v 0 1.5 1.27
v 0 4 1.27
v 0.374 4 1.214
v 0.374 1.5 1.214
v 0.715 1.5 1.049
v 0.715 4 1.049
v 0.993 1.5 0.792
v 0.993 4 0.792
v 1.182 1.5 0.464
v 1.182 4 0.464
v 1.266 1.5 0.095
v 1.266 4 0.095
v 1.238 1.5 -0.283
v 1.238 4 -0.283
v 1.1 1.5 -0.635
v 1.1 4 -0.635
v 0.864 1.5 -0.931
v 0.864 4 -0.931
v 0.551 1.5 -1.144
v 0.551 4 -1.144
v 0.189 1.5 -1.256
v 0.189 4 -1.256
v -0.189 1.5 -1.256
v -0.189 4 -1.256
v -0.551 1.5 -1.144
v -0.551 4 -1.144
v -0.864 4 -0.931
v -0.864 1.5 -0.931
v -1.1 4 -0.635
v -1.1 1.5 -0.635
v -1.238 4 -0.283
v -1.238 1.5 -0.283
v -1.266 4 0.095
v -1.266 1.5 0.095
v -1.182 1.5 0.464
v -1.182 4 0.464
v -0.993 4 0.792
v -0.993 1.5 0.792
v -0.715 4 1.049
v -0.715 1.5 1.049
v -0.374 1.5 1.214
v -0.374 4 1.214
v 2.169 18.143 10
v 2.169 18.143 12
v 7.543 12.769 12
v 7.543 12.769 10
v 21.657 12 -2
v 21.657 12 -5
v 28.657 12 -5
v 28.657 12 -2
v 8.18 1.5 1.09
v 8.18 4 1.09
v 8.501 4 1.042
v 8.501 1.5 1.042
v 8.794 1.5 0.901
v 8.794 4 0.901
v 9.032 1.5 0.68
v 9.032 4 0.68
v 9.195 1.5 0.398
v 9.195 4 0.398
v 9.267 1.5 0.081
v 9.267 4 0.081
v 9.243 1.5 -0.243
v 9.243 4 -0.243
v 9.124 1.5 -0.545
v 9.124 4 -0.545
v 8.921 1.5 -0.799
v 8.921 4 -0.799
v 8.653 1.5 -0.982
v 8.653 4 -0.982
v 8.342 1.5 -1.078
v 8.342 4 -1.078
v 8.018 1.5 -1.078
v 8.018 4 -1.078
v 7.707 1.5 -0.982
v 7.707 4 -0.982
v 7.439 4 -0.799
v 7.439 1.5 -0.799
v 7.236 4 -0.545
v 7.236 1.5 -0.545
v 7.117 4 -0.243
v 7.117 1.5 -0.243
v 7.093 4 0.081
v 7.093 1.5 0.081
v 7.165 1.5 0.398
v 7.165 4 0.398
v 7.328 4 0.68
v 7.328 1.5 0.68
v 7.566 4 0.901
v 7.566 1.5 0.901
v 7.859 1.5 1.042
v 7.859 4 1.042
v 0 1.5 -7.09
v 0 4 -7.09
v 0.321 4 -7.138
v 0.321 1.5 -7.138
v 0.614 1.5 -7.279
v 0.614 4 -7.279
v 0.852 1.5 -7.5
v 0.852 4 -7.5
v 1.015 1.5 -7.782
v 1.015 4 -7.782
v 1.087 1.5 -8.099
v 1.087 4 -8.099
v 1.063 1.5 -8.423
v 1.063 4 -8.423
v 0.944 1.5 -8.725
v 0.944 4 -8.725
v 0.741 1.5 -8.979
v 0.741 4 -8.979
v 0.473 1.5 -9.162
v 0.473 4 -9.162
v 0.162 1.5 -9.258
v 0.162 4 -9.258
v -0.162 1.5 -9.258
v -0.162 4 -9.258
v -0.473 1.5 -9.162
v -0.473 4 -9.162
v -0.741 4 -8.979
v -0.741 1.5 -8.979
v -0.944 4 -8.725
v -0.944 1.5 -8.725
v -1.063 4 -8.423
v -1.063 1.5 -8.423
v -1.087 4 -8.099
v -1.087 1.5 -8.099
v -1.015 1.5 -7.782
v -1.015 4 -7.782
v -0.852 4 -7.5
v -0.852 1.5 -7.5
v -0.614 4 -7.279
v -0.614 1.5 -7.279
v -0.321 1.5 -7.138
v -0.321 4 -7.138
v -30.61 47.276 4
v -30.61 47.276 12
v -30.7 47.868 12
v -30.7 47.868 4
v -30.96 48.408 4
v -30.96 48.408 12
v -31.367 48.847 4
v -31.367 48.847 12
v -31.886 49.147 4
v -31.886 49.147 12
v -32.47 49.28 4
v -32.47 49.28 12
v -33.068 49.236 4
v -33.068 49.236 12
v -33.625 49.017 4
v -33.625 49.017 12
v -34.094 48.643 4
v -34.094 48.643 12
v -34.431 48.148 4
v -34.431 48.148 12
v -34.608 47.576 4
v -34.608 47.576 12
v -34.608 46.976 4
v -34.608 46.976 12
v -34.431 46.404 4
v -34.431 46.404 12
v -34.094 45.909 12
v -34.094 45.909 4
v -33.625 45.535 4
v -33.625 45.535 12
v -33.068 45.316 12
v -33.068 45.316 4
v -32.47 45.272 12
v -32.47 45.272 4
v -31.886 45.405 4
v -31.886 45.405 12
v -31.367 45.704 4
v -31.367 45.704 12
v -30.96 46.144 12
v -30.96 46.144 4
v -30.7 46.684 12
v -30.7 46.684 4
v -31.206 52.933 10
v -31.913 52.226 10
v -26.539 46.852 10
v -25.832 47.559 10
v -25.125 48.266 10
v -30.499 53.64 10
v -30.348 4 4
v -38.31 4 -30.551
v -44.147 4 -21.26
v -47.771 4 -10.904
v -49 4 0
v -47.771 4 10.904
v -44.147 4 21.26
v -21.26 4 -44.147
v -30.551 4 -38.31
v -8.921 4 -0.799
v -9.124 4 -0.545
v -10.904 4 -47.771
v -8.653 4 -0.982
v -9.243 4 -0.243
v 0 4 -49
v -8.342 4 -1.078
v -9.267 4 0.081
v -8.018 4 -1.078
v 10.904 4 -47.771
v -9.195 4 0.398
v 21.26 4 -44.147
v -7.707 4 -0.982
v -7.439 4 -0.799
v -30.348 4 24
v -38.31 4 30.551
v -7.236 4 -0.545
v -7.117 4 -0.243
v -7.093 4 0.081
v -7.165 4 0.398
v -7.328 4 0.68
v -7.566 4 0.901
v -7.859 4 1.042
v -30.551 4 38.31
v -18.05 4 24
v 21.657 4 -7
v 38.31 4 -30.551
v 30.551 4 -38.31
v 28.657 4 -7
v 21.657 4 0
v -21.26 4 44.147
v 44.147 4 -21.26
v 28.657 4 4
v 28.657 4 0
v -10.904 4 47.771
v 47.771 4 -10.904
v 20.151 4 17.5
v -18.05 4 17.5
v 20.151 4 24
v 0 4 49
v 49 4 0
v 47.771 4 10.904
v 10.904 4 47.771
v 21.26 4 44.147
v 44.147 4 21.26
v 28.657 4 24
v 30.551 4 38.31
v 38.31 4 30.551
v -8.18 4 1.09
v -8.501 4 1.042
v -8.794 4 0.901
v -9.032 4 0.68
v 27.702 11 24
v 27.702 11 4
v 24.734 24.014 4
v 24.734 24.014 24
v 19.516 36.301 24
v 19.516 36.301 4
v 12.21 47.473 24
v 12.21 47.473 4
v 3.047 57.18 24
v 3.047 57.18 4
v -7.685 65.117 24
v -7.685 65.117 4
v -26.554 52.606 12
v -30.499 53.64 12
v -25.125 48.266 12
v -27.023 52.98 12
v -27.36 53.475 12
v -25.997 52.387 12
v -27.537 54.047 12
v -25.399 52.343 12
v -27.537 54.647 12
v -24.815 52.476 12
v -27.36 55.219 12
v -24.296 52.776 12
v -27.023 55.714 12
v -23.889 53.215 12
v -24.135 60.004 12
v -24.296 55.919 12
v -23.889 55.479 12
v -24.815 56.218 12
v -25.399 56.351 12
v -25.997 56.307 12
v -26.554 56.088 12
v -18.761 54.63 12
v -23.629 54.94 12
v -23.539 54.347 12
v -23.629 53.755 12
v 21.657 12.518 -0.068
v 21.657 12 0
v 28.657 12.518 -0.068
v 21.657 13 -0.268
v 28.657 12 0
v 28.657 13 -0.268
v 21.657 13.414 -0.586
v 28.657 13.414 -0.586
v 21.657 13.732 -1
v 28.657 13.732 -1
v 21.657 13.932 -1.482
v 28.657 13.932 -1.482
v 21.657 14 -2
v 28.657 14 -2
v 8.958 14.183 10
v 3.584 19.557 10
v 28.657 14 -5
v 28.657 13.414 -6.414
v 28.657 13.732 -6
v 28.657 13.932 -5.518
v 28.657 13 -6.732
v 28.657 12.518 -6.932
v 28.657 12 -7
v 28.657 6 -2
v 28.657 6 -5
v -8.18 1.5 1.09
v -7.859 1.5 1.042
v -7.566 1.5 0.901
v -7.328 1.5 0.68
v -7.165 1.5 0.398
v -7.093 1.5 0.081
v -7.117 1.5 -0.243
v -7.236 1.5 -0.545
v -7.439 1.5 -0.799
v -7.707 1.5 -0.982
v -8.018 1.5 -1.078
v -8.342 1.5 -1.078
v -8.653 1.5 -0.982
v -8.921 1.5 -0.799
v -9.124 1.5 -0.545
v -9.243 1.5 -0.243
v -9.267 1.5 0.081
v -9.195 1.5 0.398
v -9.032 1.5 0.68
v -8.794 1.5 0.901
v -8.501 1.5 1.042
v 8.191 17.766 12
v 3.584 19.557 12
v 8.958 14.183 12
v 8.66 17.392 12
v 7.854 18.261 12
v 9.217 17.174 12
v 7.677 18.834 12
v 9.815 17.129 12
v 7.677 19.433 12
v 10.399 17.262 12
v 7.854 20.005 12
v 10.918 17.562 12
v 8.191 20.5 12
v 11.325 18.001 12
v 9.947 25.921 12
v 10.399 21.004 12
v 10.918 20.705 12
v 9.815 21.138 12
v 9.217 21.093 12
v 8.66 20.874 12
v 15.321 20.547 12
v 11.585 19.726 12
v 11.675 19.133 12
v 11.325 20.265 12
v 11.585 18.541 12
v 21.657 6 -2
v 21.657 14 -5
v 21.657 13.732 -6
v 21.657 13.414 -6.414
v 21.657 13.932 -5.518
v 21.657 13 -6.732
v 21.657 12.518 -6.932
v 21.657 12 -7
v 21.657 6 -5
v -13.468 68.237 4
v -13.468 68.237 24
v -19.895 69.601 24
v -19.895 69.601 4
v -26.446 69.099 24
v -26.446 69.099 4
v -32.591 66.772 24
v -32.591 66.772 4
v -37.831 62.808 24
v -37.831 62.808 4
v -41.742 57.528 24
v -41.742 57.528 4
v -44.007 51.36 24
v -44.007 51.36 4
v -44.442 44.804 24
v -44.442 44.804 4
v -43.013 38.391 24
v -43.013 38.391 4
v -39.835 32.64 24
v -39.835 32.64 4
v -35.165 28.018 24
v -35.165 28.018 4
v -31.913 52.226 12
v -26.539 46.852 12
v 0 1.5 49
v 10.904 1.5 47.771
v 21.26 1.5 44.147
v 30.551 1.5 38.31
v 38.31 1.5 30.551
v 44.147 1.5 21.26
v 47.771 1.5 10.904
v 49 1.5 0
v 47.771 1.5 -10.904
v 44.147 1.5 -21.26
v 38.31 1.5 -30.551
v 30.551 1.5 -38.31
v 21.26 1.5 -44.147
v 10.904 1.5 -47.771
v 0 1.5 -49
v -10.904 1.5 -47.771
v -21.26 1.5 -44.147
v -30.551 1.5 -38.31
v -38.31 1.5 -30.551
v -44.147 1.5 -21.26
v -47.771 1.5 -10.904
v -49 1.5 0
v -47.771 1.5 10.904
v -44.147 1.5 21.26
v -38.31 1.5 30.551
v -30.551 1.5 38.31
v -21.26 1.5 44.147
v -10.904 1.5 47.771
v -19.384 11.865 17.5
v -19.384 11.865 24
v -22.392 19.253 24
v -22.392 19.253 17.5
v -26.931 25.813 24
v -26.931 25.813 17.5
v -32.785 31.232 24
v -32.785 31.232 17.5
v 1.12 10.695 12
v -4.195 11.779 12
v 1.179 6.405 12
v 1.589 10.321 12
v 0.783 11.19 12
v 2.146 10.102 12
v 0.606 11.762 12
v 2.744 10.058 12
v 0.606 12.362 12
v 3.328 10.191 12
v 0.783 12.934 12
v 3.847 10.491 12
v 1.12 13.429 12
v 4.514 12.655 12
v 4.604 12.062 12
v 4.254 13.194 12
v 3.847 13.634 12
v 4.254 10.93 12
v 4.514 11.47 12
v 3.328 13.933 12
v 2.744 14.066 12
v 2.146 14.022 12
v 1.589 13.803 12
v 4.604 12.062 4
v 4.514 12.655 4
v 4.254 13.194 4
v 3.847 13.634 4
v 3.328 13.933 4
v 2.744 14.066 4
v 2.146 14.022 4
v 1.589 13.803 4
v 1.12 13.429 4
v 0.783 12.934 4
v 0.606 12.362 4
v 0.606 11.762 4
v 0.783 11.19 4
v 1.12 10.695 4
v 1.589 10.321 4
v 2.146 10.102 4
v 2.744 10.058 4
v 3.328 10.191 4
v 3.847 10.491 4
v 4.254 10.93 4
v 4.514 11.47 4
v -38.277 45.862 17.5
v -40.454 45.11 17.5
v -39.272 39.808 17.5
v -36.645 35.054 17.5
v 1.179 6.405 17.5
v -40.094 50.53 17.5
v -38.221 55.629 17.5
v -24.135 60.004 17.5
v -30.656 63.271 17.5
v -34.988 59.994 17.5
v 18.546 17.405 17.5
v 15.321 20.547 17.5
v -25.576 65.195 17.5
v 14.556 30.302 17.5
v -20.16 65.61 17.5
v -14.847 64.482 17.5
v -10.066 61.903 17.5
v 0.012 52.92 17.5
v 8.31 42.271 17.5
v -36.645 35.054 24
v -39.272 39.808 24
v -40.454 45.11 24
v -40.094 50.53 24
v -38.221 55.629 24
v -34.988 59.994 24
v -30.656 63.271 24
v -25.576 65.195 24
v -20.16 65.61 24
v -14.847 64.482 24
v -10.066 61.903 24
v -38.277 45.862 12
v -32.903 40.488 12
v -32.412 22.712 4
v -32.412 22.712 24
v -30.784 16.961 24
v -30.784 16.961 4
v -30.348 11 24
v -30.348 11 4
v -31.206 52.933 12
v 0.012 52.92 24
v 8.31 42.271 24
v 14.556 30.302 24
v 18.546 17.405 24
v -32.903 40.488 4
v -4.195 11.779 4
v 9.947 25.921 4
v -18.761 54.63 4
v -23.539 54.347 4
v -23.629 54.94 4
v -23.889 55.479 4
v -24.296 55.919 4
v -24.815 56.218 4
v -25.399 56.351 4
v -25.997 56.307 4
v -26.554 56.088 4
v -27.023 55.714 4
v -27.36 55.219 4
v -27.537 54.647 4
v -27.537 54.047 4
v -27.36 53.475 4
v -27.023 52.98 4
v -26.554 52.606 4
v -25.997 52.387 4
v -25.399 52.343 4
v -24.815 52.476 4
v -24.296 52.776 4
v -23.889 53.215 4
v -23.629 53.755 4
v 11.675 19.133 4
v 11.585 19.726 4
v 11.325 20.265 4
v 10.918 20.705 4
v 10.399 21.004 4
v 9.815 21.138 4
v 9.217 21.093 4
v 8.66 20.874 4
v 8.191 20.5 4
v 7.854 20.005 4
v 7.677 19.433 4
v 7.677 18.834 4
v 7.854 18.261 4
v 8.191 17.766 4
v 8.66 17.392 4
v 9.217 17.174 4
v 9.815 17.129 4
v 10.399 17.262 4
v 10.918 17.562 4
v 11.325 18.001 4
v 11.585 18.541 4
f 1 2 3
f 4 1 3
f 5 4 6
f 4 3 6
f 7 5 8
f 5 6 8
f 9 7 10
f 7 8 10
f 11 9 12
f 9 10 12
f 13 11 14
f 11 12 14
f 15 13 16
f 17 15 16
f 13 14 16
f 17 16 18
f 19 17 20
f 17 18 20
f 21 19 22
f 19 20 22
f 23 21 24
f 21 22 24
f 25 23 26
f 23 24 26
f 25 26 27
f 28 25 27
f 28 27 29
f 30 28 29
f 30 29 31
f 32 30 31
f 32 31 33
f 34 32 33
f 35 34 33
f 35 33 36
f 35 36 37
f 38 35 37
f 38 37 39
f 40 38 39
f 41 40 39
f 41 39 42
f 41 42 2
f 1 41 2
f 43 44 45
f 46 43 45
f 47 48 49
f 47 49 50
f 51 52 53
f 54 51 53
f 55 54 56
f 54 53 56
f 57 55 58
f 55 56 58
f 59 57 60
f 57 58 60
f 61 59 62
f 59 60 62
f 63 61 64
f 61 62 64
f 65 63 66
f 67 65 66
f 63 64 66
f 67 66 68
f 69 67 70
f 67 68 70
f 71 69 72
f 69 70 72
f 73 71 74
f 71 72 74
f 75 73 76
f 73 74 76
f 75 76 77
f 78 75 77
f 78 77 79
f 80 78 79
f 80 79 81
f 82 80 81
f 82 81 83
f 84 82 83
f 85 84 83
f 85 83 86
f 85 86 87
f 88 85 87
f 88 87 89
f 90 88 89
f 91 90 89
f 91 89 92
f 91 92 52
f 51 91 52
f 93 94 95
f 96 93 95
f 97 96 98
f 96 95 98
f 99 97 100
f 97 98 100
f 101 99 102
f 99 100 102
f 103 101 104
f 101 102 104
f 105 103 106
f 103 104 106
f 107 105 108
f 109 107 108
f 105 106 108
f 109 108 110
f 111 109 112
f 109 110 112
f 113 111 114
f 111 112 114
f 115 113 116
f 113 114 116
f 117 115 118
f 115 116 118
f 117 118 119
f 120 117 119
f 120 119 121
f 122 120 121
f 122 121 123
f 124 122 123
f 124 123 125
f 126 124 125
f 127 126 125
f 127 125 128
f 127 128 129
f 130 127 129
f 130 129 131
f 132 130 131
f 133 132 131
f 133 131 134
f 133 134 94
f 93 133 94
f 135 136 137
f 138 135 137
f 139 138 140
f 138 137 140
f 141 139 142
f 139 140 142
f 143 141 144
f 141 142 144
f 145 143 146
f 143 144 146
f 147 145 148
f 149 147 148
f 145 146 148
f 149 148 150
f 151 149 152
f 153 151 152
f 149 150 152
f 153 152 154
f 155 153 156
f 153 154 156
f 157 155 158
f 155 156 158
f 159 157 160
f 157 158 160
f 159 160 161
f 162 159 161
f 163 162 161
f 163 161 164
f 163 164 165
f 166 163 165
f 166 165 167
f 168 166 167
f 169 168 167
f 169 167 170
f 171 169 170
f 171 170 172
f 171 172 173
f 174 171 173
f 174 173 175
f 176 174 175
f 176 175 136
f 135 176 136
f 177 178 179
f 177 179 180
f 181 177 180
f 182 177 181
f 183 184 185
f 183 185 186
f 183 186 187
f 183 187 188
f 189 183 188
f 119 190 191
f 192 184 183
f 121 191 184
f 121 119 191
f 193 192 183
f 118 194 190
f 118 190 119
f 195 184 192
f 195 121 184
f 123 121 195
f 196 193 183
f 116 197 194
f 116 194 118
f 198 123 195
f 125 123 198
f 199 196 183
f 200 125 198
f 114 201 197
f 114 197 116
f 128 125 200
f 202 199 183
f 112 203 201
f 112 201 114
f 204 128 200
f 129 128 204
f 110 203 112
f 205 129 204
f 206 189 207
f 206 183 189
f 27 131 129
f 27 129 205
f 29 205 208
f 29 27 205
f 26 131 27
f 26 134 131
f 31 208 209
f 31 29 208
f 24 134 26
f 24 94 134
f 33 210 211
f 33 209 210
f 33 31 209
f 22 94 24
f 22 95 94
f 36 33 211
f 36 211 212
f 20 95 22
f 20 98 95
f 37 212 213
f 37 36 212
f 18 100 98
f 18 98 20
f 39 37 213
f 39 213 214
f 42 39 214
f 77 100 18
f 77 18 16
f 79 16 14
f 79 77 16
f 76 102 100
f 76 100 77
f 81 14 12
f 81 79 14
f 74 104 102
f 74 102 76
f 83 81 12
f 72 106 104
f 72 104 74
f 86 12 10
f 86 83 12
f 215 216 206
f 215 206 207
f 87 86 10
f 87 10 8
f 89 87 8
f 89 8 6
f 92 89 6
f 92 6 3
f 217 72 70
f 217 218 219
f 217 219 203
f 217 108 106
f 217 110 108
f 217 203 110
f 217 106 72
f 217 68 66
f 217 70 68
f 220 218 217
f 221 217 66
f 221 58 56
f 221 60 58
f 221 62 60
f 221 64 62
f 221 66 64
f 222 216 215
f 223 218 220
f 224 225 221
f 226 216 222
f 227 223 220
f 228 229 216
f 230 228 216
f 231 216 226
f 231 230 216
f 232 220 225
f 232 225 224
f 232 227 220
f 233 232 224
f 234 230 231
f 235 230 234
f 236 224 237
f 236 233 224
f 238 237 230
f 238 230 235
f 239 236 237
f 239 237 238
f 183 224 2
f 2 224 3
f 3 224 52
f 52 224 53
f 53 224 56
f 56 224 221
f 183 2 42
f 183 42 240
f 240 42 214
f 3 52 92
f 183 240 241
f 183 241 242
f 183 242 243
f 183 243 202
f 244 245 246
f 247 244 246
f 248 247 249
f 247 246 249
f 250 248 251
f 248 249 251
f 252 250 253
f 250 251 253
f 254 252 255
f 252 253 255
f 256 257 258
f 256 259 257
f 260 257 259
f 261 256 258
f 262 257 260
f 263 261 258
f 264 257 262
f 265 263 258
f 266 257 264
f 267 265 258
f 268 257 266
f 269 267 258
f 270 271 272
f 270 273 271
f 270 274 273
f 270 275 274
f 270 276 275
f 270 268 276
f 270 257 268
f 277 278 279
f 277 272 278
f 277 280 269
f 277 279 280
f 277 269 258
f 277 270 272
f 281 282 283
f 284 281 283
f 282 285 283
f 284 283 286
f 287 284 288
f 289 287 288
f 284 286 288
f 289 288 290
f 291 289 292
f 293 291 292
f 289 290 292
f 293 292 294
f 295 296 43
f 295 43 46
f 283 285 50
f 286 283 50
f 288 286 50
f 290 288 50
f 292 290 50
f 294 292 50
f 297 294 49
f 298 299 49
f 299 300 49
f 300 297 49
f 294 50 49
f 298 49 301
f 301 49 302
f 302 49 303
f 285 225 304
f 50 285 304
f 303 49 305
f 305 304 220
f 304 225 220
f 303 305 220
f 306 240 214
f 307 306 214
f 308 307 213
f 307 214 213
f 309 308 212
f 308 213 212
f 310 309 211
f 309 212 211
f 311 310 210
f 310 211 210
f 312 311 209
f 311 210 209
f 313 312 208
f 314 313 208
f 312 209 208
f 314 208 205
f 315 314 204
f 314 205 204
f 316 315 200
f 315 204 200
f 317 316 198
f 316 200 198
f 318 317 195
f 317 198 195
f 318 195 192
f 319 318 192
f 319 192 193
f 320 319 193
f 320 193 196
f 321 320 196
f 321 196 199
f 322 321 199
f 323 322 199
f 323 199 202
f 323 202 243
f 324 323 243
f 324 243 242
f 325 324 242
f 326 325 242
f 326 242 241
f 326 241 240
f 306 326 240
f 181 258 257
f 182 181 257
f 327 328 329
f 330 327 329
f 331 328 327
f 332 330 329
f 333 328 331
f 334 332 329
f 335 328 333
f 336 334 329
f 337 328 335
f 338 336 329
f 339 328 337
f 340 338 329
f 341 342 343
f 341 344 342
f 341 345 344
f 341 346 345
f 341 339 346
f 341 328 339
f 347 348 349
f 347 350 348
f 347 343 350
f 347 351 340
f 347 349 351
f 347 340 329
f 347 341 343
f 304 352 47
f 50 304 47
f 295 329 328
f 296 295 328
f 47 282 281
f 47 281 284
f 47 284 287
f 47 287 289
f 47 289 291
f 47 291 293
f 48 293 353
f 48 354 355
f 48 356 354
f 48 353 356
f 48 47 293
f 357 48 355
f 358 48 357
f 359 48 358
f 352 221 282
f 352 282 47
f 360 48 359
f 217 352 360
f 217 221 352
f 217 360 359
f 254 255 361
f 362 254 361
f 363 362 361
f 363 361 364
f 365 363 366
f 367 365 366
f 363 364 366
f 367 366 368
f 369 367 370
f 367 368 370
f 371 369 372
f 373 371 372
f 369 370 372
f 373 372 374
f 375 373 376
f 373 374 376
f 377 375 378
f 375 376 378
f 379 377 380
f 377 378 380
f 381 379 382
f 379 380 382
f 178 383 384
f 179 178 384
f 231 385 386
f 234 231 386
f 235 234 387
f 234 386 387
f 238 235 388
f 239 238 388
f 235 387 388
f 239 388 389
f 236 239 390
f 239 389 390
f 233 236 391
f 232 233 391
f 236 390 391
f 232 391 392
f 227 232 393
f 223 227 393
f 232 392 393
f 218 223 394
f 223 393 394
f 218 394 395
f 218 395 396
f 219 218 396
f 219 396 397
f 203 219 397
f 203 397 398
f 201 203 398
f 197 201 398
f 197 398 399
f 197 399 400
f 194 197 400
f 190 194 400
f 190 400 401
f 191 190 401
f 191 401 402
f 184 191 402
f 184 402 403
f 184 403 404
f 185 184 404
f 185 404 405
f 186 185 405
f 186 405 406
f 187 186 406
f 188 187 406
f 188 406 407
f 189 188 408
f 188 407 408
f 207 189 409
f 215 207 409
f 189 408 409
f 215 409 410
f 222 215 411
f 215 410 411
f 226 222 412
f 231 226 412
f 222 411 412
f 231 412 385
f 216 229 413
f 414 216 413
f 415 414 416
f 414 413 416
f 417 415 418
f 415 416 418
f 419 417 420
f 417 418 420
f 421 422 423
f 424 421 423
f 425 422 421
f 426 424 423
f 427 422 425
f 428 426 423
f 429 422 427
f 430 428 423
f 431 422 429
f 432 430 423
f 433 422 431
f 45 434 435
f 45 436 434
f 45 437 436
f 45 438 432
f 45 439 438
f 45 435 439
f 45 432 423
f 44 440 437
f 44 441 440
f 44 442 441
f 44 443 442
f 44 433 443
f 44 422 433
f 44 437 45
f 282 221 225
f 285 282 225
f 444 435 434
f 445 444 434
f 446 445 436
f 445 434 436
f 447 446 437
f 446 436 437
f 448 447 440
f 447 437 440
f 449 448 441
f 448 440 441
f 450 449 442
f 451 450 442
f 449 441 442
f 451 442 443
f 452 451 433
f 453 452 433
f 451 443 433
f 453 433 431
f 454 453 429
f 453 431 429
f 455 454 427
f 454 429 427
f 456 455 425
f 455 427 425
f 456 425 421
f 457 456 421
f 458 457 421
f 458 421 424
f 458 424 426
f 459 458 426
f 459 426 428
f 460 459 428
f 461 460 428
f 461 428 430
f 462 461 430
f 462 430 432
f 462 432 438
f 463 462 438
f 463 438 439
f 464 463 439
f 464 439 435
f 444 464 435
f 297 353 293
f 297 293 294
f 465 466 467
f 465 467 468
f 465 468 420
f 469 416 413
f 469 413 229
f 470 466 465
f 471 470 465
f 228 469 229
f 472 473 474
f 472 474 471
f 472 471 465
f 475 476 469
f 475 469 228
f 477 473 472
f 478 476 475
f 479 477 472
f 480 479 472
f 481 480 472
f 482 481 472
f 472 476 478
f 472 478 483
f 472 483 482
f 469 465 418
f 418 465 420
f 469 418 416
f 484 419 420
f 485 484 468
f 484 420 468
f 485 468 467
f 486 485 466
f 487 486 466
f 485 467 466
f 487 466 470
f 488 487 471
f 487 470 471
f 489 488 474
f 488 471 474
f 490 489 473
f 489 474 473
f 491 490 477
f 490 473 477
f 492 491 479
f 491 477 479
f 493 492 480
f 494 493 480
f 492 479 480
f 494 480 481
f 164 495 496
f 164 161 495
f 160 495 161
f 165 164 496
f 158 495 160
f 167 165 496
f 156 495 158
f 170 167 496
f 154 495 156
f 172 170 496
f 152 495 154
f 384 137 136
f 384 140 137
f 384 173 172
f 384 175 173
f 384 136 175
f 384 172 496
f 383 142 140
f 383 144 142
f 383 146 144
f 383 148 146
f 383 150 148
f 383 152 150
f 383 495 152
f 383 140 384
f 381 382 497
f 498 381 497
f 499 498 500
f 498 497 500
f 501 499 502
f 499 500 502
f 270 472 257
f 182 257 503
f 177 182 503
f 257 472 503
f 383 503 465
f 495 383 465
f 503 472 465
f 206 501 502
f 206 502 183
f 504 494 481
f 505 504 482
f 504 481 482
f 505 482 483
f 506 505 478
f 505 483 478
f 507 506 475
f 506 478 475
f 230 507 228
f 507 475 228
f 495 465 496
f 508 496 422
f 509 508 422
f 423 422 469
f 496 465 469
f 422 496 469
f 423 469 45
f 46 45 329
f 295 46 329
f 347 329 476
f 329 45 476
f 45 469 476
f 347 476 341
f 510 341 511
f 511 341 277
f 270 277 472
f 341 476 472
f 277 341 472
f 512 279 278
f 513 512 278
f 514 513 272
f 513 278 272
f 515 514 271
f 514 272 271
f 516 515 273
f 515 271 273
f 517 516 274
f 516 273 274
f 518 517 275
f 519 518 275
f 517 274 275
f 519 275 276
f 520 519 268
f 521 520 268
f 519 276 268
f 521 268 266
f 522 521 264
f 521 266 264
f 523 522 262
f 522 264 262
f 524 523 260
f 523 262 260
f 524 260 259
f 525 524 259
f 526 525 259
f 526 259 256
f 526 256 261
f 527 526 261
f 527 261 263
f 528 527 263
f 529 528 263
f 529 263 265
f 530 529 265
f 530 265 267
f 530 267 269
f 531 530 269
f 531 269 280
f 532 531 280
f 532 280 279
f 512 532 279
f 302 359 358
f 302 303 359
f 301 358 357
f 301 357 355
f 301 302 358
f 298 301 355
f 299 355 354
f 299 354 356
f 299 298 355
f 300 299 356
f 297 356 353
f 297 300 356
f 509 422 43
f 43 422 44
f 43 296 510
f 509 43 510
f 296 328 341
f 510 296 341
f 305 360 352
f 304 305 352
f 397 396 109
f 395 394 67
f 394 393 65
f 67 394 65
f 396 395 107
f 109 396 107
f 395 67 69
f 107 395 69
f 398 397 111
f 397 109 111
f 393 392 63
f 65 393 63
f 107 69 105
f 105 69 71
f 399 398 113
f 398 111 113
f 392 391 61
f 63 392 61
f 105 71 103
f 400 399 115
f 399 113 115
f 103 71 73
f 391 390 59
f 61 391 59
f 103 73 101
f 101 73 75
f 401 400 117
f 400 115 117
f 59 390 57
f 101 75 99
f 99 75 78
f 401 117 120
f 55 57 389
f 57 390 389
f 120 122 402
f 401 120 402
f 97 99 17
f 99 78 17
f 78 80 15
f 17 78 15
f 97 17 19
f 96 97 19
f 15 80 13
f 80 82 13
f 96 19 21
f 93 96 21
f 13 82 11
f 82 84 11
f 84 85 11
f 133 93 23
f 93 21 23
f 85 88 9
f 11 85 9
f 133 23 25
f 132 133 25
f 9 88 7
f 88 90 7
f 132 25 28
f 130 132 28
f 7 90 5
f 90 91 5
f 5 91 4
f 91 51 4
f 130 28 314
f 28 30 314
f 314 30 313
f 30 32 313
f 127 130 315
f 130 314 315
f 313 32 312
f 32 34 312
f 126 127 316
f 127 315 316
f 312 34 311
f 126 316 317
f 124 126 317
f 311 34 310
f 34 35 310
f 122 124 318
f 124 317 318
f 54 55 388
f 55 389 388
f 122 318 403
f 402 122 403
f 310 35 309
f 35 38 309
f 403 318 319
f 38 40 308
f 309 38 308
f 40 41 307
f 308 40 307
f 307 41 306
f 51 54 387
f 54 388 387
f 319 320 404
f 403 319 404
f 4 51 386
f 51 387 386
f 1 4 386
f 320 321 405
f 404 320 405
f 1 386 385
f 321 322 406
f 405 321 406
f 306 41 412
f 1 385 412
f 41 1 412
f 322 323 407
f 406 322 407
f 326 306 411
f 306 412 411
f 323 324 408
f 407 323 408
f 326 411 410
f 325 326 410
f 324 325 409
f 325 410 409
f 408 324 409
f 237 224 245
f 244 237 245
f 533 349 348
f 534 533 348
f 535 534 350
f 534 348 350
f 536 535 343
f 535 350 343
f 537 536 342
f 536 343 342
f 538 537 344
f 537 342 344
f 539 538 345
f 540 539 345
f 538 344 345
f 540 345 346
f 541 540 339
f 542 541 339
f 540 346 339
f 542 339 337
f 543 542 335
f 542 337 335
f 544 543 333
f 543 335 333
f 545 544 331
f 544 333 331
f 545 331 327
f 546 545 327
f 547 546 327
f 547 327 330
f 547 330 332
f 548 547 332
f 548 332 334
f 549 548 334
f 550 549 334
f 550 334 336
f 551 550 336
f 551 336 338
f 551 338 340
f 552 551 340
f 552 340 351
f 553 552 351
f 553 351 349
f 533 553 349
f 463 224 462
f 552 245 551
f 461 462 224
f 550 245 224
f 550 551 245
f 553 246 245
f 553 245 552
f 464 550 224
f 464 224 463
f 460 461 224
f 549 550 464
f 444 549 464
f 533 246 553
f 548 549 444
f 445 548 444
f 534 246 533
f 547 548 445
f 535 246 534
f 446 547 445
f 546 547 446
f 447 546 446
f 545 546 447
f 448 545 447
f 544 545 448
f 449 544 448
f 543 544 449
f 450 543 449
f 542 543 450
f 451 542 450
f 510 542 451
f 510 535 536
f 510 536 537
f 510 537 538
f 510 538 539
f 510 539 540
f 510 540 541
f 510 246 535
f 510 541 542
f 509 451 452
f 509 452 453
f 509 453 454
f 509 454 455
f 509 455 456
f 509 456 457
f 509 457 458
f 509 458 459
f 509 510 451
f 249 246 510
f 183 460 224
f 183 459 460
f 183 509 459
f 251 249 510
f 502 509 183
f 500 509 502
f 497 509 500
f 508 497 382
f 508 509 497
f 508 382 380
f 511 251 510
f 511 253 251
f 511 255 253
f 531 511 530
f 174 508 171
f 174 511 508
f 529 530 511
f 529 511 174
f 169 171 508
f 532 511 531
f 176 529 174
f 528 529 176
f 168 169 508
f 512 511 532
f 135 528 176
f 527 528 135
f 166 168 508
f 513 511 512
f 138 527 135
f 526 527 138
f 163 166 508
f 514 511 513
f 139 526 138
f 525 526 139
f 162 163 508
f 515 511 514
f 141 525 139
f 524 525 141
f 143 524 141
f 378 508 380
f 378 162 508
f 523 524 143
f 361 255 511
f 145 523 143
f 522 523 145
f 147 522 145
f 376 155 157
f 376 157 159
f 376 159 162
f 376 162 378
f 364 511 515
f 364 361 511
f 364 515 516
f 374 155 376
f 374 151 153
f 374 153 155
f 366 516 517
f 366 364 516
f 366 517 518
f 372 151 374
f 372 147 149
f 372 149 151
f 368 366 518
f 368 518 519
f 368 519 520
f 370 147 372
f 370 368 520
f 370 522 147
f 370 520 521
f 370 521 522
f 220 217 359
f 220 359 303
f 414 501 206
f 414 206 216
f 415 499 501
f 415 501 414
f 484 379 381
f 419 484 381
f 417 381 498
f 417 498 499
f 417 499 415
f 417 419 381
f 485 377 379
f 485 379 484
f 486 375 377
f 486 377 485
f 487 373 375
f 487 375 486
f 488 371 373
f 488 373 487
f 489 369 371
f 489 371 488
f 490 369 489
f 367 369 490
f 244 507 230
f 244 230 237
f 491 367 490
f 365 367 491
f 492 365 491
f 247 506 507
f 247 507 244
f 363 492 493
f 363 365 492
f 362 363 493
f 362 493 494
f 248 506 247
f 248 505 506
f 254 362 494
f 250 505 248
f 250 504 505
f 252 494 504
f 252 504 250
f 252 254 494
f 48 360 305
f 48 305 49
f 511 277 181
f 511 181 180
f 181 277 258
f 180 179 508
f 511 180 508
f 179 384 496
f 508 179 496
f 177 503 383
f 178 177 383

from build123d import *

# Parameters (mm, degrees)
SKETCH1_R           = 49
BOSS_EXTRUDE1_DEPTH = 4
BOSS_EXTRUDE2_DEPTH = 20
BOSS_EXTRUDE3_DEPTH = 13.5
SKETCH3_4_R         = 6
BOSS_EXTRUDE4_DEPTH = 13.5
CUT_EXTRUDE5_DEPTH  = 5.5
CUT_EXTRUDE6_DEPTH  = 9
SKETCH11_W          = 7
SKETCH11_H          = 7
BOSS_EXTRUDE5_DEPTH = 10
CUT_EXTRUDE9_REACH  = 112.656
SKETCH12_W          = 3
SKETCH12_H          = 6
FILLET1_R           = 2
CUT_EXTRUDE10_REACH = 97.458
SKETCH13_R          = 1.27
CUT_EXTRUDE11_DEPTH = 95
CUT_EXTRUDE12_DEPTH = 2
CUT_EXTRUDE13_DEPTH = 2
CUT_EXTRUDE14_REACH = 97.458
SKETCH17_R          = 1.09
CUT_EXTRUDE15_REACH = 106.754
SKETCH18_R          = 2.01


with BuildPart() as part:
    # Sketch1 → Boss-Extrude1 (new body)
    with BuildSketch(Plane(origin=(0, 0, 0), x_dir=(1, 0, 0), z_dir=(0, 1, 0))):
        with Locations(Location((0, 0, 0), (0, 0, 270))):
            Circle(SKETCH1_R)
    extrude(amount=BOSS_EXTRUDE1_DEPTH)

    # Sketch3 → Boss-Extrude2 (add)
    with BuildSketch(Plane.XY.offset(4)):
        with BuildLine():
            Line((-30.347886599, 11), (-30.347886599, 4))
            Line((-30.347886599, 4), (-18.049754955, 4))
            ThreePointArc((-18.049754955, 4), (-22.391739007, 19.253033546), (-32.784586802, 31.232039038))
            ThreePointArc((-32.784586802, 31.232039038), (-36.760767526, 57.926722426), (-10.066084138, 61.902903149))
            ThreePointArc((-10.066084138, 61.902903149), (11.703451168, 36.427560581), (20.150880429, 4))
            Line((20.150880429, 4), (28.656645727, 4))
            Line((28.656645727, 4), (27.702300884, 11))
            ThreePointArc((27.702300884, 11), (16.110760067, 42.048857672), (-7.685218322, 65.117164801))
            ThreePointArc((-7.685218322, 65.117164801), (-39.975029178, 60.307588242), (-35.165452618, 28.017777386))
            ThreePointArc((-35.165452618, 28.017777386), (-31.452519142, 19.87808091), (-30.347886599, 11))
        make_face()
    extrude(amount=BOSS_EXTRUDE2_DEPTH)

    # Sketch3<3> → Boss-Extrude3 (add)
    with BuildSketch(Plane.XY.offset(4)):
        with BuildLine():
            ThreePointArc((-32.784586802, 31.232039038), (-22.391739007, 19.253033546), (-18.049754955, 4))
            Line((-18.049754955, 4), (20.150880429, 4))
            ThreePointArc((20.150880429, 4), (11.703451168, 36.427560581), (-10.066084138, 61.902903149))
            ThreePointArc((-10.066084138, 61.902903149), (-36.760767526, 57.926722426), (-32.784586802, 31.232039038))
        make_face()
        Polygon((14.142135624, 25.142135624), (0, 11), (-28.496403282, 39.496403282), (-14.354267658, 53.638538906), align=None, mode=Mode.SUBTRACT)
    extrude(amount=BOSS_EXTRUDE3_DEPTH)

    # Sketch3<4> → Boss-Extrude4 (add)
    # profile 1 of 2: a face of its own
    with BuildSketch(Plane.XY.offset(4)):
        Polygon((-28.496403282, 39.496403282), (-14.354267658, 53.638538906), (14.142135624, 25.142135624), (0, 11), align=None)
        with Locations((-14.297699116, 39.439834739)):
            Circle(SKETCH3_4_R, mode=Mode.SUBTRACT)
    # profile 2 of 2: a face of its own
    with BuildSketch(Plane.XY.offset(4)):
        with Locations((-14.297699116, 39.439834739)):
            Circle(SKETCH3_4_R)
    extrude(amount=BOSS_EXTRUDE4_DEPTH)

    # Sketch5 → Cut-Extrude5 (cut)
    with BuildSketch(Plane.XY.offset(17.5)):
        Polygon((15.321499667, 20.547344219), (-24.135058723, 60.003902609), (-38.277194347, 45.861766985), (1.179364043, 6.405208595), align=None)
    extrude(amount=-CUT_EXTRUDE5_DEPTH, mode=Mode.SUBTRACT)

    # Sketch8 → Cut-Extrude6 (cut)
    with BuildSketch(Plane.XY.offset(12)):
        Polygon((-18.761047186, 54.629891072), (-32.90318281, 40.487755448), (-4.194647494, 11.779220132), (9.94748813, 25.921355756), align=None)
    extrude(amount=-CUT_EXTRUDE6_DEPTH, mode=Mode.SUBTRACT)

    # Sketch11 → Boss-Extrude5 (add)
    with BuildSketch(Plane(origin=(0, 4, 0), x_dir=(1, 0, 0), z_dir=(0, 1, 0))):
        with Locations((25.156645727, 3.5)):
            Rectangle(SKETCH11_W, SKETCH11_H)
    extrude(amount=BOSS_EXTRUDE5_DEPTH)

    # Sketch12 → Cut-Extrude9 (cut, up to next)
    with BuildSketch(Plane.ZY.offset(-21.656645727), mode=Mode.PRIVATE) as cut_extrude9_sk1:
        with Locations((-3.5, 9)):
            Rectangle(SKETCH12_W, SKETCH12_H)
    cut_extrude9_tool1 = extrude(cut_extrude9_sk1.sketch, amount=-CUT_EXTRUDE9_REACH, mode=Mode.PRIVATE) & part.part
    add(cut_extrude9_tool1.solids().sort_by_distance((21.656646, 9, -3.5))[0], mode=Mode.SUBTRACT)

    # Fillet1
    fillet1_edges = [part.edges().sort_by_distance(p)[0] for p in [
        (25.156645727, 14, 0),
        (25.156645727, 14, -7),
    ]]
    fillet(fillet1_edges, radius=FILLET1_R)

    # Sketch13 → Cut-Extrude10 (cut, up to next)
    with BuildSketch(Plane(origin=(0, 4, 0), x_dir=(1, 0, 0), z_dir=(0, 1, 0)), mode=Mode.PRIVATE) as cut_extrude10_sk1:
        with Locations(Location((0, 0, 0), (0, 0, 270))):
            Circle(SKETCH13_R)
    cut_extrude10_tool1 = extrude(cut_extrude10_sk1.sketch, amount=-CUT_EXTRUDE10_REACH, mode=Mode.PRIVATE) & part.part
    add(cut_extrude10_tool1.solids().sort_by_distance((0, 4, 0))[0], mode=Mode.SUBTRACT)

    # Sketch14 → Cut-Extrude11 (cut, symmetric)
    with BuildSketch(Plane.XY.offset(17.5)):
        Polygon((-49, 1.5), (50.231696903, 1.5), (50.231696903, 0), (-50.303866734, 0), (-50.303866734, 1.5), align=None)
    extrude(amount=CUT_EXTRUDE11_DEPTH, both=True, mode=Mode.SUBTRACT)

    # Sketch16 → Cut-Extrude12 (cut)
    with BuildSketch(Plane.XY.offset(12)):
        Polygon((3.583527099, 19.557394725), (2.876420318, 18.850287944), (8.250431855, 13.476276407), (8.957538636, 14.183383188), align=None)
        Polygon((8.250431855, 13.476276407), (2.876420318, 18.850287944), (2.169313537, 18.143181163), (7.543325074, 12.769169626), align=None)
    extrude(amount=-CUT_EXTRUDE12_DEPTH, mode=Mode.SUBTRACT)

    # Sketch16<3> → Cut-Extrude13 (cut)
    with BuildSketch(Plane.XY.offset(12)):
        Polygon((-25.832114998, 47.55882326), (-31.206126535, 52.932834797), (-31.913233317, 52.225728016), (-26.53922178, 46.851716479), align=None)
        Polygon((-30.499019754, 53.639941578), (-31.206126535, 52.932834797), (-25.832114998, 47.55882326), (-25.125008217, 48.265930041), align=None)
    extrude(amount=-CUT_EXTRUDE13_DEPTH, mode=Mode.SUBTRACT)

    # Sketch17 → Cut-Extrude14 (cut, up to next)
    with BuildSketch(Plane(origin=(0, 4, 0), x_dir=(1, 0, 0), z_dir=(0, 1, 0)), mode=Mode.PRIVATE) as cut_extrude14_sk1:
        with Locations(Location((8.18, 0, 0), (0, 0, 270))):
            Circle(SKETCH17_R)
    cut_extrude14_tool1 = extrude(cut_extrude14_sk1.sketch, amount=-CUT_EXTRUDE14_REACH, mode=Mode.PRIVATE) & part.part
    # Sketch17 → Cut-Extrude14 (cut, up to next)
    with BuildSketch(Plane(origin=(0, 4, 0), x_dir=(1, 0, 0), z_dir=(0, 1, 0)), mode=Mode.PRIVATE) as cut_extrude14_sk2:
        with Locations(Location((-8.18, 0, 0), (0, 0, 270))):
            Circle(SKETCH17_R)
    cut_extrude14_tool2 = extrude(cut_extrude14_sk2.sketch, amount=-CUT_EXTRUDE14_REACH, mode=Mode.PRIVATE) & part.part
    # Sketch17 → Cut-Extrude14 (cut, up to next)
    with BuildSketch(Plane(origin=(0, 4, 0), x_dir=(1, 0, 0), z_dir=(0, 1, 0)), mode=Mode.PRIVATE) as cut_extrude14_sk3:
        with Locations(Location((0, 8.18, 0), (0, 0, 270))):
            Circle(SKETCH17_R)
    cut_extrude14_tool3 = extrude(cut_extrude14_sk3.sketch, amount=-CUT_EXTRUDE14_REACH, mode=Mode.PRIVATE) & part.part
    add(cut_extrude14_tool1.solids().sort_by_distance((8.18, 4, 0))[0], mode=Mode.SUBTRACT)
    add(cut_extrude14_tool2.solids().sort_by_distance((-8.18, 4, 0))[0], mode=Mode.SUBTRACT)
    add(cut_extrude14_tool3.solids().sort_by_distance((0, 4, -8.18))[0], mode=Mode.SUBTRACT)

    # Sketch18 → Cut-Extrude15 (cut, up to next)
    with BuildSketch(Plane.XY.offset(12), mode=Mode.PRIVATE) as cut_extrude15_sk1:
        with Locations((2.593577605, 12.062062844)):
            Circle(SKETCH18_R)
    cut_extrude15_tool1 = extrude(cut_extrude15_sk1.sketch, amount=-CUT_EXTRUDE15_REACH, mode=Mode.PRIVATE) & part.part
    # Sketch18 → Cut-Extrude15 (cut, up to next)
    with BuildSketch(Plane.XY.offset(12), mode=Mode.PRIVATE) as cut_extrude15_sk2:
        with Locations((9.664645417, 19.133130656)):
            Circle(SKETCH18_R)
    cut_extrude15_tool2 = extrude(cut_extrude15_sk2.sketch, amount=-CUT_EXTRUDE15_REACH, mode=Mode.PRIVATE) & part.part
    # Sketch18 → Cut-Extrude15 (cut, up to next)
    with BuildSketch(Plane.XY.offset(12), mode=Mode.PRIVATE) as cut_extrude15_sk3:
        with Locations((-32.620340098, 47.275980548)):
            Circle(SKETCH18_R)
    cut_extrude15_tool3 = extrude(cut_extrude15_sk3.sketch, amount=-CUT_EXTRUDE15_REACH, mode=Mode.PRIVATE) & part.part
    # Sketch18 → Cut-Extrude15 (cut, up to next)
    with BuildSketch(Plane.XY.offset(12), mode=Mode.PRIVATE) as cut_extrude15_sk4:
        with Locations((-25.549272286, 54.347048359)):
            Circle(SKETCH18_R)
    cut_extrude15_tool4 = extrude(cut_extrude15_sk4.sketch, amount=-CUT_EXTRUDE15_REACH, mode=Mode.PRIVATE) & part.part
    add(cut_extrude15_tool1.solids().sort_by_distance((2.593578, 12.062063, 12))[0], mode=Mode.SUBTRACT)
    add(cut_extrude15_tool2.solids().sort_by_distance((9.664645, 19.133131, 12))[0], mode=Mode.SUBTRACT)
    add(cut_extrude15_tool3.solids().sort_by_distance((-32.62034, 47.275981, 12))[0], mode=Mode.SUBTRACT)
    add(cut_extrude15_tool4.solids().sort_by_distance((-25.549272, 54.347048, 12))[0], mode=Mode.SUBTRACT)


solid = part.part
